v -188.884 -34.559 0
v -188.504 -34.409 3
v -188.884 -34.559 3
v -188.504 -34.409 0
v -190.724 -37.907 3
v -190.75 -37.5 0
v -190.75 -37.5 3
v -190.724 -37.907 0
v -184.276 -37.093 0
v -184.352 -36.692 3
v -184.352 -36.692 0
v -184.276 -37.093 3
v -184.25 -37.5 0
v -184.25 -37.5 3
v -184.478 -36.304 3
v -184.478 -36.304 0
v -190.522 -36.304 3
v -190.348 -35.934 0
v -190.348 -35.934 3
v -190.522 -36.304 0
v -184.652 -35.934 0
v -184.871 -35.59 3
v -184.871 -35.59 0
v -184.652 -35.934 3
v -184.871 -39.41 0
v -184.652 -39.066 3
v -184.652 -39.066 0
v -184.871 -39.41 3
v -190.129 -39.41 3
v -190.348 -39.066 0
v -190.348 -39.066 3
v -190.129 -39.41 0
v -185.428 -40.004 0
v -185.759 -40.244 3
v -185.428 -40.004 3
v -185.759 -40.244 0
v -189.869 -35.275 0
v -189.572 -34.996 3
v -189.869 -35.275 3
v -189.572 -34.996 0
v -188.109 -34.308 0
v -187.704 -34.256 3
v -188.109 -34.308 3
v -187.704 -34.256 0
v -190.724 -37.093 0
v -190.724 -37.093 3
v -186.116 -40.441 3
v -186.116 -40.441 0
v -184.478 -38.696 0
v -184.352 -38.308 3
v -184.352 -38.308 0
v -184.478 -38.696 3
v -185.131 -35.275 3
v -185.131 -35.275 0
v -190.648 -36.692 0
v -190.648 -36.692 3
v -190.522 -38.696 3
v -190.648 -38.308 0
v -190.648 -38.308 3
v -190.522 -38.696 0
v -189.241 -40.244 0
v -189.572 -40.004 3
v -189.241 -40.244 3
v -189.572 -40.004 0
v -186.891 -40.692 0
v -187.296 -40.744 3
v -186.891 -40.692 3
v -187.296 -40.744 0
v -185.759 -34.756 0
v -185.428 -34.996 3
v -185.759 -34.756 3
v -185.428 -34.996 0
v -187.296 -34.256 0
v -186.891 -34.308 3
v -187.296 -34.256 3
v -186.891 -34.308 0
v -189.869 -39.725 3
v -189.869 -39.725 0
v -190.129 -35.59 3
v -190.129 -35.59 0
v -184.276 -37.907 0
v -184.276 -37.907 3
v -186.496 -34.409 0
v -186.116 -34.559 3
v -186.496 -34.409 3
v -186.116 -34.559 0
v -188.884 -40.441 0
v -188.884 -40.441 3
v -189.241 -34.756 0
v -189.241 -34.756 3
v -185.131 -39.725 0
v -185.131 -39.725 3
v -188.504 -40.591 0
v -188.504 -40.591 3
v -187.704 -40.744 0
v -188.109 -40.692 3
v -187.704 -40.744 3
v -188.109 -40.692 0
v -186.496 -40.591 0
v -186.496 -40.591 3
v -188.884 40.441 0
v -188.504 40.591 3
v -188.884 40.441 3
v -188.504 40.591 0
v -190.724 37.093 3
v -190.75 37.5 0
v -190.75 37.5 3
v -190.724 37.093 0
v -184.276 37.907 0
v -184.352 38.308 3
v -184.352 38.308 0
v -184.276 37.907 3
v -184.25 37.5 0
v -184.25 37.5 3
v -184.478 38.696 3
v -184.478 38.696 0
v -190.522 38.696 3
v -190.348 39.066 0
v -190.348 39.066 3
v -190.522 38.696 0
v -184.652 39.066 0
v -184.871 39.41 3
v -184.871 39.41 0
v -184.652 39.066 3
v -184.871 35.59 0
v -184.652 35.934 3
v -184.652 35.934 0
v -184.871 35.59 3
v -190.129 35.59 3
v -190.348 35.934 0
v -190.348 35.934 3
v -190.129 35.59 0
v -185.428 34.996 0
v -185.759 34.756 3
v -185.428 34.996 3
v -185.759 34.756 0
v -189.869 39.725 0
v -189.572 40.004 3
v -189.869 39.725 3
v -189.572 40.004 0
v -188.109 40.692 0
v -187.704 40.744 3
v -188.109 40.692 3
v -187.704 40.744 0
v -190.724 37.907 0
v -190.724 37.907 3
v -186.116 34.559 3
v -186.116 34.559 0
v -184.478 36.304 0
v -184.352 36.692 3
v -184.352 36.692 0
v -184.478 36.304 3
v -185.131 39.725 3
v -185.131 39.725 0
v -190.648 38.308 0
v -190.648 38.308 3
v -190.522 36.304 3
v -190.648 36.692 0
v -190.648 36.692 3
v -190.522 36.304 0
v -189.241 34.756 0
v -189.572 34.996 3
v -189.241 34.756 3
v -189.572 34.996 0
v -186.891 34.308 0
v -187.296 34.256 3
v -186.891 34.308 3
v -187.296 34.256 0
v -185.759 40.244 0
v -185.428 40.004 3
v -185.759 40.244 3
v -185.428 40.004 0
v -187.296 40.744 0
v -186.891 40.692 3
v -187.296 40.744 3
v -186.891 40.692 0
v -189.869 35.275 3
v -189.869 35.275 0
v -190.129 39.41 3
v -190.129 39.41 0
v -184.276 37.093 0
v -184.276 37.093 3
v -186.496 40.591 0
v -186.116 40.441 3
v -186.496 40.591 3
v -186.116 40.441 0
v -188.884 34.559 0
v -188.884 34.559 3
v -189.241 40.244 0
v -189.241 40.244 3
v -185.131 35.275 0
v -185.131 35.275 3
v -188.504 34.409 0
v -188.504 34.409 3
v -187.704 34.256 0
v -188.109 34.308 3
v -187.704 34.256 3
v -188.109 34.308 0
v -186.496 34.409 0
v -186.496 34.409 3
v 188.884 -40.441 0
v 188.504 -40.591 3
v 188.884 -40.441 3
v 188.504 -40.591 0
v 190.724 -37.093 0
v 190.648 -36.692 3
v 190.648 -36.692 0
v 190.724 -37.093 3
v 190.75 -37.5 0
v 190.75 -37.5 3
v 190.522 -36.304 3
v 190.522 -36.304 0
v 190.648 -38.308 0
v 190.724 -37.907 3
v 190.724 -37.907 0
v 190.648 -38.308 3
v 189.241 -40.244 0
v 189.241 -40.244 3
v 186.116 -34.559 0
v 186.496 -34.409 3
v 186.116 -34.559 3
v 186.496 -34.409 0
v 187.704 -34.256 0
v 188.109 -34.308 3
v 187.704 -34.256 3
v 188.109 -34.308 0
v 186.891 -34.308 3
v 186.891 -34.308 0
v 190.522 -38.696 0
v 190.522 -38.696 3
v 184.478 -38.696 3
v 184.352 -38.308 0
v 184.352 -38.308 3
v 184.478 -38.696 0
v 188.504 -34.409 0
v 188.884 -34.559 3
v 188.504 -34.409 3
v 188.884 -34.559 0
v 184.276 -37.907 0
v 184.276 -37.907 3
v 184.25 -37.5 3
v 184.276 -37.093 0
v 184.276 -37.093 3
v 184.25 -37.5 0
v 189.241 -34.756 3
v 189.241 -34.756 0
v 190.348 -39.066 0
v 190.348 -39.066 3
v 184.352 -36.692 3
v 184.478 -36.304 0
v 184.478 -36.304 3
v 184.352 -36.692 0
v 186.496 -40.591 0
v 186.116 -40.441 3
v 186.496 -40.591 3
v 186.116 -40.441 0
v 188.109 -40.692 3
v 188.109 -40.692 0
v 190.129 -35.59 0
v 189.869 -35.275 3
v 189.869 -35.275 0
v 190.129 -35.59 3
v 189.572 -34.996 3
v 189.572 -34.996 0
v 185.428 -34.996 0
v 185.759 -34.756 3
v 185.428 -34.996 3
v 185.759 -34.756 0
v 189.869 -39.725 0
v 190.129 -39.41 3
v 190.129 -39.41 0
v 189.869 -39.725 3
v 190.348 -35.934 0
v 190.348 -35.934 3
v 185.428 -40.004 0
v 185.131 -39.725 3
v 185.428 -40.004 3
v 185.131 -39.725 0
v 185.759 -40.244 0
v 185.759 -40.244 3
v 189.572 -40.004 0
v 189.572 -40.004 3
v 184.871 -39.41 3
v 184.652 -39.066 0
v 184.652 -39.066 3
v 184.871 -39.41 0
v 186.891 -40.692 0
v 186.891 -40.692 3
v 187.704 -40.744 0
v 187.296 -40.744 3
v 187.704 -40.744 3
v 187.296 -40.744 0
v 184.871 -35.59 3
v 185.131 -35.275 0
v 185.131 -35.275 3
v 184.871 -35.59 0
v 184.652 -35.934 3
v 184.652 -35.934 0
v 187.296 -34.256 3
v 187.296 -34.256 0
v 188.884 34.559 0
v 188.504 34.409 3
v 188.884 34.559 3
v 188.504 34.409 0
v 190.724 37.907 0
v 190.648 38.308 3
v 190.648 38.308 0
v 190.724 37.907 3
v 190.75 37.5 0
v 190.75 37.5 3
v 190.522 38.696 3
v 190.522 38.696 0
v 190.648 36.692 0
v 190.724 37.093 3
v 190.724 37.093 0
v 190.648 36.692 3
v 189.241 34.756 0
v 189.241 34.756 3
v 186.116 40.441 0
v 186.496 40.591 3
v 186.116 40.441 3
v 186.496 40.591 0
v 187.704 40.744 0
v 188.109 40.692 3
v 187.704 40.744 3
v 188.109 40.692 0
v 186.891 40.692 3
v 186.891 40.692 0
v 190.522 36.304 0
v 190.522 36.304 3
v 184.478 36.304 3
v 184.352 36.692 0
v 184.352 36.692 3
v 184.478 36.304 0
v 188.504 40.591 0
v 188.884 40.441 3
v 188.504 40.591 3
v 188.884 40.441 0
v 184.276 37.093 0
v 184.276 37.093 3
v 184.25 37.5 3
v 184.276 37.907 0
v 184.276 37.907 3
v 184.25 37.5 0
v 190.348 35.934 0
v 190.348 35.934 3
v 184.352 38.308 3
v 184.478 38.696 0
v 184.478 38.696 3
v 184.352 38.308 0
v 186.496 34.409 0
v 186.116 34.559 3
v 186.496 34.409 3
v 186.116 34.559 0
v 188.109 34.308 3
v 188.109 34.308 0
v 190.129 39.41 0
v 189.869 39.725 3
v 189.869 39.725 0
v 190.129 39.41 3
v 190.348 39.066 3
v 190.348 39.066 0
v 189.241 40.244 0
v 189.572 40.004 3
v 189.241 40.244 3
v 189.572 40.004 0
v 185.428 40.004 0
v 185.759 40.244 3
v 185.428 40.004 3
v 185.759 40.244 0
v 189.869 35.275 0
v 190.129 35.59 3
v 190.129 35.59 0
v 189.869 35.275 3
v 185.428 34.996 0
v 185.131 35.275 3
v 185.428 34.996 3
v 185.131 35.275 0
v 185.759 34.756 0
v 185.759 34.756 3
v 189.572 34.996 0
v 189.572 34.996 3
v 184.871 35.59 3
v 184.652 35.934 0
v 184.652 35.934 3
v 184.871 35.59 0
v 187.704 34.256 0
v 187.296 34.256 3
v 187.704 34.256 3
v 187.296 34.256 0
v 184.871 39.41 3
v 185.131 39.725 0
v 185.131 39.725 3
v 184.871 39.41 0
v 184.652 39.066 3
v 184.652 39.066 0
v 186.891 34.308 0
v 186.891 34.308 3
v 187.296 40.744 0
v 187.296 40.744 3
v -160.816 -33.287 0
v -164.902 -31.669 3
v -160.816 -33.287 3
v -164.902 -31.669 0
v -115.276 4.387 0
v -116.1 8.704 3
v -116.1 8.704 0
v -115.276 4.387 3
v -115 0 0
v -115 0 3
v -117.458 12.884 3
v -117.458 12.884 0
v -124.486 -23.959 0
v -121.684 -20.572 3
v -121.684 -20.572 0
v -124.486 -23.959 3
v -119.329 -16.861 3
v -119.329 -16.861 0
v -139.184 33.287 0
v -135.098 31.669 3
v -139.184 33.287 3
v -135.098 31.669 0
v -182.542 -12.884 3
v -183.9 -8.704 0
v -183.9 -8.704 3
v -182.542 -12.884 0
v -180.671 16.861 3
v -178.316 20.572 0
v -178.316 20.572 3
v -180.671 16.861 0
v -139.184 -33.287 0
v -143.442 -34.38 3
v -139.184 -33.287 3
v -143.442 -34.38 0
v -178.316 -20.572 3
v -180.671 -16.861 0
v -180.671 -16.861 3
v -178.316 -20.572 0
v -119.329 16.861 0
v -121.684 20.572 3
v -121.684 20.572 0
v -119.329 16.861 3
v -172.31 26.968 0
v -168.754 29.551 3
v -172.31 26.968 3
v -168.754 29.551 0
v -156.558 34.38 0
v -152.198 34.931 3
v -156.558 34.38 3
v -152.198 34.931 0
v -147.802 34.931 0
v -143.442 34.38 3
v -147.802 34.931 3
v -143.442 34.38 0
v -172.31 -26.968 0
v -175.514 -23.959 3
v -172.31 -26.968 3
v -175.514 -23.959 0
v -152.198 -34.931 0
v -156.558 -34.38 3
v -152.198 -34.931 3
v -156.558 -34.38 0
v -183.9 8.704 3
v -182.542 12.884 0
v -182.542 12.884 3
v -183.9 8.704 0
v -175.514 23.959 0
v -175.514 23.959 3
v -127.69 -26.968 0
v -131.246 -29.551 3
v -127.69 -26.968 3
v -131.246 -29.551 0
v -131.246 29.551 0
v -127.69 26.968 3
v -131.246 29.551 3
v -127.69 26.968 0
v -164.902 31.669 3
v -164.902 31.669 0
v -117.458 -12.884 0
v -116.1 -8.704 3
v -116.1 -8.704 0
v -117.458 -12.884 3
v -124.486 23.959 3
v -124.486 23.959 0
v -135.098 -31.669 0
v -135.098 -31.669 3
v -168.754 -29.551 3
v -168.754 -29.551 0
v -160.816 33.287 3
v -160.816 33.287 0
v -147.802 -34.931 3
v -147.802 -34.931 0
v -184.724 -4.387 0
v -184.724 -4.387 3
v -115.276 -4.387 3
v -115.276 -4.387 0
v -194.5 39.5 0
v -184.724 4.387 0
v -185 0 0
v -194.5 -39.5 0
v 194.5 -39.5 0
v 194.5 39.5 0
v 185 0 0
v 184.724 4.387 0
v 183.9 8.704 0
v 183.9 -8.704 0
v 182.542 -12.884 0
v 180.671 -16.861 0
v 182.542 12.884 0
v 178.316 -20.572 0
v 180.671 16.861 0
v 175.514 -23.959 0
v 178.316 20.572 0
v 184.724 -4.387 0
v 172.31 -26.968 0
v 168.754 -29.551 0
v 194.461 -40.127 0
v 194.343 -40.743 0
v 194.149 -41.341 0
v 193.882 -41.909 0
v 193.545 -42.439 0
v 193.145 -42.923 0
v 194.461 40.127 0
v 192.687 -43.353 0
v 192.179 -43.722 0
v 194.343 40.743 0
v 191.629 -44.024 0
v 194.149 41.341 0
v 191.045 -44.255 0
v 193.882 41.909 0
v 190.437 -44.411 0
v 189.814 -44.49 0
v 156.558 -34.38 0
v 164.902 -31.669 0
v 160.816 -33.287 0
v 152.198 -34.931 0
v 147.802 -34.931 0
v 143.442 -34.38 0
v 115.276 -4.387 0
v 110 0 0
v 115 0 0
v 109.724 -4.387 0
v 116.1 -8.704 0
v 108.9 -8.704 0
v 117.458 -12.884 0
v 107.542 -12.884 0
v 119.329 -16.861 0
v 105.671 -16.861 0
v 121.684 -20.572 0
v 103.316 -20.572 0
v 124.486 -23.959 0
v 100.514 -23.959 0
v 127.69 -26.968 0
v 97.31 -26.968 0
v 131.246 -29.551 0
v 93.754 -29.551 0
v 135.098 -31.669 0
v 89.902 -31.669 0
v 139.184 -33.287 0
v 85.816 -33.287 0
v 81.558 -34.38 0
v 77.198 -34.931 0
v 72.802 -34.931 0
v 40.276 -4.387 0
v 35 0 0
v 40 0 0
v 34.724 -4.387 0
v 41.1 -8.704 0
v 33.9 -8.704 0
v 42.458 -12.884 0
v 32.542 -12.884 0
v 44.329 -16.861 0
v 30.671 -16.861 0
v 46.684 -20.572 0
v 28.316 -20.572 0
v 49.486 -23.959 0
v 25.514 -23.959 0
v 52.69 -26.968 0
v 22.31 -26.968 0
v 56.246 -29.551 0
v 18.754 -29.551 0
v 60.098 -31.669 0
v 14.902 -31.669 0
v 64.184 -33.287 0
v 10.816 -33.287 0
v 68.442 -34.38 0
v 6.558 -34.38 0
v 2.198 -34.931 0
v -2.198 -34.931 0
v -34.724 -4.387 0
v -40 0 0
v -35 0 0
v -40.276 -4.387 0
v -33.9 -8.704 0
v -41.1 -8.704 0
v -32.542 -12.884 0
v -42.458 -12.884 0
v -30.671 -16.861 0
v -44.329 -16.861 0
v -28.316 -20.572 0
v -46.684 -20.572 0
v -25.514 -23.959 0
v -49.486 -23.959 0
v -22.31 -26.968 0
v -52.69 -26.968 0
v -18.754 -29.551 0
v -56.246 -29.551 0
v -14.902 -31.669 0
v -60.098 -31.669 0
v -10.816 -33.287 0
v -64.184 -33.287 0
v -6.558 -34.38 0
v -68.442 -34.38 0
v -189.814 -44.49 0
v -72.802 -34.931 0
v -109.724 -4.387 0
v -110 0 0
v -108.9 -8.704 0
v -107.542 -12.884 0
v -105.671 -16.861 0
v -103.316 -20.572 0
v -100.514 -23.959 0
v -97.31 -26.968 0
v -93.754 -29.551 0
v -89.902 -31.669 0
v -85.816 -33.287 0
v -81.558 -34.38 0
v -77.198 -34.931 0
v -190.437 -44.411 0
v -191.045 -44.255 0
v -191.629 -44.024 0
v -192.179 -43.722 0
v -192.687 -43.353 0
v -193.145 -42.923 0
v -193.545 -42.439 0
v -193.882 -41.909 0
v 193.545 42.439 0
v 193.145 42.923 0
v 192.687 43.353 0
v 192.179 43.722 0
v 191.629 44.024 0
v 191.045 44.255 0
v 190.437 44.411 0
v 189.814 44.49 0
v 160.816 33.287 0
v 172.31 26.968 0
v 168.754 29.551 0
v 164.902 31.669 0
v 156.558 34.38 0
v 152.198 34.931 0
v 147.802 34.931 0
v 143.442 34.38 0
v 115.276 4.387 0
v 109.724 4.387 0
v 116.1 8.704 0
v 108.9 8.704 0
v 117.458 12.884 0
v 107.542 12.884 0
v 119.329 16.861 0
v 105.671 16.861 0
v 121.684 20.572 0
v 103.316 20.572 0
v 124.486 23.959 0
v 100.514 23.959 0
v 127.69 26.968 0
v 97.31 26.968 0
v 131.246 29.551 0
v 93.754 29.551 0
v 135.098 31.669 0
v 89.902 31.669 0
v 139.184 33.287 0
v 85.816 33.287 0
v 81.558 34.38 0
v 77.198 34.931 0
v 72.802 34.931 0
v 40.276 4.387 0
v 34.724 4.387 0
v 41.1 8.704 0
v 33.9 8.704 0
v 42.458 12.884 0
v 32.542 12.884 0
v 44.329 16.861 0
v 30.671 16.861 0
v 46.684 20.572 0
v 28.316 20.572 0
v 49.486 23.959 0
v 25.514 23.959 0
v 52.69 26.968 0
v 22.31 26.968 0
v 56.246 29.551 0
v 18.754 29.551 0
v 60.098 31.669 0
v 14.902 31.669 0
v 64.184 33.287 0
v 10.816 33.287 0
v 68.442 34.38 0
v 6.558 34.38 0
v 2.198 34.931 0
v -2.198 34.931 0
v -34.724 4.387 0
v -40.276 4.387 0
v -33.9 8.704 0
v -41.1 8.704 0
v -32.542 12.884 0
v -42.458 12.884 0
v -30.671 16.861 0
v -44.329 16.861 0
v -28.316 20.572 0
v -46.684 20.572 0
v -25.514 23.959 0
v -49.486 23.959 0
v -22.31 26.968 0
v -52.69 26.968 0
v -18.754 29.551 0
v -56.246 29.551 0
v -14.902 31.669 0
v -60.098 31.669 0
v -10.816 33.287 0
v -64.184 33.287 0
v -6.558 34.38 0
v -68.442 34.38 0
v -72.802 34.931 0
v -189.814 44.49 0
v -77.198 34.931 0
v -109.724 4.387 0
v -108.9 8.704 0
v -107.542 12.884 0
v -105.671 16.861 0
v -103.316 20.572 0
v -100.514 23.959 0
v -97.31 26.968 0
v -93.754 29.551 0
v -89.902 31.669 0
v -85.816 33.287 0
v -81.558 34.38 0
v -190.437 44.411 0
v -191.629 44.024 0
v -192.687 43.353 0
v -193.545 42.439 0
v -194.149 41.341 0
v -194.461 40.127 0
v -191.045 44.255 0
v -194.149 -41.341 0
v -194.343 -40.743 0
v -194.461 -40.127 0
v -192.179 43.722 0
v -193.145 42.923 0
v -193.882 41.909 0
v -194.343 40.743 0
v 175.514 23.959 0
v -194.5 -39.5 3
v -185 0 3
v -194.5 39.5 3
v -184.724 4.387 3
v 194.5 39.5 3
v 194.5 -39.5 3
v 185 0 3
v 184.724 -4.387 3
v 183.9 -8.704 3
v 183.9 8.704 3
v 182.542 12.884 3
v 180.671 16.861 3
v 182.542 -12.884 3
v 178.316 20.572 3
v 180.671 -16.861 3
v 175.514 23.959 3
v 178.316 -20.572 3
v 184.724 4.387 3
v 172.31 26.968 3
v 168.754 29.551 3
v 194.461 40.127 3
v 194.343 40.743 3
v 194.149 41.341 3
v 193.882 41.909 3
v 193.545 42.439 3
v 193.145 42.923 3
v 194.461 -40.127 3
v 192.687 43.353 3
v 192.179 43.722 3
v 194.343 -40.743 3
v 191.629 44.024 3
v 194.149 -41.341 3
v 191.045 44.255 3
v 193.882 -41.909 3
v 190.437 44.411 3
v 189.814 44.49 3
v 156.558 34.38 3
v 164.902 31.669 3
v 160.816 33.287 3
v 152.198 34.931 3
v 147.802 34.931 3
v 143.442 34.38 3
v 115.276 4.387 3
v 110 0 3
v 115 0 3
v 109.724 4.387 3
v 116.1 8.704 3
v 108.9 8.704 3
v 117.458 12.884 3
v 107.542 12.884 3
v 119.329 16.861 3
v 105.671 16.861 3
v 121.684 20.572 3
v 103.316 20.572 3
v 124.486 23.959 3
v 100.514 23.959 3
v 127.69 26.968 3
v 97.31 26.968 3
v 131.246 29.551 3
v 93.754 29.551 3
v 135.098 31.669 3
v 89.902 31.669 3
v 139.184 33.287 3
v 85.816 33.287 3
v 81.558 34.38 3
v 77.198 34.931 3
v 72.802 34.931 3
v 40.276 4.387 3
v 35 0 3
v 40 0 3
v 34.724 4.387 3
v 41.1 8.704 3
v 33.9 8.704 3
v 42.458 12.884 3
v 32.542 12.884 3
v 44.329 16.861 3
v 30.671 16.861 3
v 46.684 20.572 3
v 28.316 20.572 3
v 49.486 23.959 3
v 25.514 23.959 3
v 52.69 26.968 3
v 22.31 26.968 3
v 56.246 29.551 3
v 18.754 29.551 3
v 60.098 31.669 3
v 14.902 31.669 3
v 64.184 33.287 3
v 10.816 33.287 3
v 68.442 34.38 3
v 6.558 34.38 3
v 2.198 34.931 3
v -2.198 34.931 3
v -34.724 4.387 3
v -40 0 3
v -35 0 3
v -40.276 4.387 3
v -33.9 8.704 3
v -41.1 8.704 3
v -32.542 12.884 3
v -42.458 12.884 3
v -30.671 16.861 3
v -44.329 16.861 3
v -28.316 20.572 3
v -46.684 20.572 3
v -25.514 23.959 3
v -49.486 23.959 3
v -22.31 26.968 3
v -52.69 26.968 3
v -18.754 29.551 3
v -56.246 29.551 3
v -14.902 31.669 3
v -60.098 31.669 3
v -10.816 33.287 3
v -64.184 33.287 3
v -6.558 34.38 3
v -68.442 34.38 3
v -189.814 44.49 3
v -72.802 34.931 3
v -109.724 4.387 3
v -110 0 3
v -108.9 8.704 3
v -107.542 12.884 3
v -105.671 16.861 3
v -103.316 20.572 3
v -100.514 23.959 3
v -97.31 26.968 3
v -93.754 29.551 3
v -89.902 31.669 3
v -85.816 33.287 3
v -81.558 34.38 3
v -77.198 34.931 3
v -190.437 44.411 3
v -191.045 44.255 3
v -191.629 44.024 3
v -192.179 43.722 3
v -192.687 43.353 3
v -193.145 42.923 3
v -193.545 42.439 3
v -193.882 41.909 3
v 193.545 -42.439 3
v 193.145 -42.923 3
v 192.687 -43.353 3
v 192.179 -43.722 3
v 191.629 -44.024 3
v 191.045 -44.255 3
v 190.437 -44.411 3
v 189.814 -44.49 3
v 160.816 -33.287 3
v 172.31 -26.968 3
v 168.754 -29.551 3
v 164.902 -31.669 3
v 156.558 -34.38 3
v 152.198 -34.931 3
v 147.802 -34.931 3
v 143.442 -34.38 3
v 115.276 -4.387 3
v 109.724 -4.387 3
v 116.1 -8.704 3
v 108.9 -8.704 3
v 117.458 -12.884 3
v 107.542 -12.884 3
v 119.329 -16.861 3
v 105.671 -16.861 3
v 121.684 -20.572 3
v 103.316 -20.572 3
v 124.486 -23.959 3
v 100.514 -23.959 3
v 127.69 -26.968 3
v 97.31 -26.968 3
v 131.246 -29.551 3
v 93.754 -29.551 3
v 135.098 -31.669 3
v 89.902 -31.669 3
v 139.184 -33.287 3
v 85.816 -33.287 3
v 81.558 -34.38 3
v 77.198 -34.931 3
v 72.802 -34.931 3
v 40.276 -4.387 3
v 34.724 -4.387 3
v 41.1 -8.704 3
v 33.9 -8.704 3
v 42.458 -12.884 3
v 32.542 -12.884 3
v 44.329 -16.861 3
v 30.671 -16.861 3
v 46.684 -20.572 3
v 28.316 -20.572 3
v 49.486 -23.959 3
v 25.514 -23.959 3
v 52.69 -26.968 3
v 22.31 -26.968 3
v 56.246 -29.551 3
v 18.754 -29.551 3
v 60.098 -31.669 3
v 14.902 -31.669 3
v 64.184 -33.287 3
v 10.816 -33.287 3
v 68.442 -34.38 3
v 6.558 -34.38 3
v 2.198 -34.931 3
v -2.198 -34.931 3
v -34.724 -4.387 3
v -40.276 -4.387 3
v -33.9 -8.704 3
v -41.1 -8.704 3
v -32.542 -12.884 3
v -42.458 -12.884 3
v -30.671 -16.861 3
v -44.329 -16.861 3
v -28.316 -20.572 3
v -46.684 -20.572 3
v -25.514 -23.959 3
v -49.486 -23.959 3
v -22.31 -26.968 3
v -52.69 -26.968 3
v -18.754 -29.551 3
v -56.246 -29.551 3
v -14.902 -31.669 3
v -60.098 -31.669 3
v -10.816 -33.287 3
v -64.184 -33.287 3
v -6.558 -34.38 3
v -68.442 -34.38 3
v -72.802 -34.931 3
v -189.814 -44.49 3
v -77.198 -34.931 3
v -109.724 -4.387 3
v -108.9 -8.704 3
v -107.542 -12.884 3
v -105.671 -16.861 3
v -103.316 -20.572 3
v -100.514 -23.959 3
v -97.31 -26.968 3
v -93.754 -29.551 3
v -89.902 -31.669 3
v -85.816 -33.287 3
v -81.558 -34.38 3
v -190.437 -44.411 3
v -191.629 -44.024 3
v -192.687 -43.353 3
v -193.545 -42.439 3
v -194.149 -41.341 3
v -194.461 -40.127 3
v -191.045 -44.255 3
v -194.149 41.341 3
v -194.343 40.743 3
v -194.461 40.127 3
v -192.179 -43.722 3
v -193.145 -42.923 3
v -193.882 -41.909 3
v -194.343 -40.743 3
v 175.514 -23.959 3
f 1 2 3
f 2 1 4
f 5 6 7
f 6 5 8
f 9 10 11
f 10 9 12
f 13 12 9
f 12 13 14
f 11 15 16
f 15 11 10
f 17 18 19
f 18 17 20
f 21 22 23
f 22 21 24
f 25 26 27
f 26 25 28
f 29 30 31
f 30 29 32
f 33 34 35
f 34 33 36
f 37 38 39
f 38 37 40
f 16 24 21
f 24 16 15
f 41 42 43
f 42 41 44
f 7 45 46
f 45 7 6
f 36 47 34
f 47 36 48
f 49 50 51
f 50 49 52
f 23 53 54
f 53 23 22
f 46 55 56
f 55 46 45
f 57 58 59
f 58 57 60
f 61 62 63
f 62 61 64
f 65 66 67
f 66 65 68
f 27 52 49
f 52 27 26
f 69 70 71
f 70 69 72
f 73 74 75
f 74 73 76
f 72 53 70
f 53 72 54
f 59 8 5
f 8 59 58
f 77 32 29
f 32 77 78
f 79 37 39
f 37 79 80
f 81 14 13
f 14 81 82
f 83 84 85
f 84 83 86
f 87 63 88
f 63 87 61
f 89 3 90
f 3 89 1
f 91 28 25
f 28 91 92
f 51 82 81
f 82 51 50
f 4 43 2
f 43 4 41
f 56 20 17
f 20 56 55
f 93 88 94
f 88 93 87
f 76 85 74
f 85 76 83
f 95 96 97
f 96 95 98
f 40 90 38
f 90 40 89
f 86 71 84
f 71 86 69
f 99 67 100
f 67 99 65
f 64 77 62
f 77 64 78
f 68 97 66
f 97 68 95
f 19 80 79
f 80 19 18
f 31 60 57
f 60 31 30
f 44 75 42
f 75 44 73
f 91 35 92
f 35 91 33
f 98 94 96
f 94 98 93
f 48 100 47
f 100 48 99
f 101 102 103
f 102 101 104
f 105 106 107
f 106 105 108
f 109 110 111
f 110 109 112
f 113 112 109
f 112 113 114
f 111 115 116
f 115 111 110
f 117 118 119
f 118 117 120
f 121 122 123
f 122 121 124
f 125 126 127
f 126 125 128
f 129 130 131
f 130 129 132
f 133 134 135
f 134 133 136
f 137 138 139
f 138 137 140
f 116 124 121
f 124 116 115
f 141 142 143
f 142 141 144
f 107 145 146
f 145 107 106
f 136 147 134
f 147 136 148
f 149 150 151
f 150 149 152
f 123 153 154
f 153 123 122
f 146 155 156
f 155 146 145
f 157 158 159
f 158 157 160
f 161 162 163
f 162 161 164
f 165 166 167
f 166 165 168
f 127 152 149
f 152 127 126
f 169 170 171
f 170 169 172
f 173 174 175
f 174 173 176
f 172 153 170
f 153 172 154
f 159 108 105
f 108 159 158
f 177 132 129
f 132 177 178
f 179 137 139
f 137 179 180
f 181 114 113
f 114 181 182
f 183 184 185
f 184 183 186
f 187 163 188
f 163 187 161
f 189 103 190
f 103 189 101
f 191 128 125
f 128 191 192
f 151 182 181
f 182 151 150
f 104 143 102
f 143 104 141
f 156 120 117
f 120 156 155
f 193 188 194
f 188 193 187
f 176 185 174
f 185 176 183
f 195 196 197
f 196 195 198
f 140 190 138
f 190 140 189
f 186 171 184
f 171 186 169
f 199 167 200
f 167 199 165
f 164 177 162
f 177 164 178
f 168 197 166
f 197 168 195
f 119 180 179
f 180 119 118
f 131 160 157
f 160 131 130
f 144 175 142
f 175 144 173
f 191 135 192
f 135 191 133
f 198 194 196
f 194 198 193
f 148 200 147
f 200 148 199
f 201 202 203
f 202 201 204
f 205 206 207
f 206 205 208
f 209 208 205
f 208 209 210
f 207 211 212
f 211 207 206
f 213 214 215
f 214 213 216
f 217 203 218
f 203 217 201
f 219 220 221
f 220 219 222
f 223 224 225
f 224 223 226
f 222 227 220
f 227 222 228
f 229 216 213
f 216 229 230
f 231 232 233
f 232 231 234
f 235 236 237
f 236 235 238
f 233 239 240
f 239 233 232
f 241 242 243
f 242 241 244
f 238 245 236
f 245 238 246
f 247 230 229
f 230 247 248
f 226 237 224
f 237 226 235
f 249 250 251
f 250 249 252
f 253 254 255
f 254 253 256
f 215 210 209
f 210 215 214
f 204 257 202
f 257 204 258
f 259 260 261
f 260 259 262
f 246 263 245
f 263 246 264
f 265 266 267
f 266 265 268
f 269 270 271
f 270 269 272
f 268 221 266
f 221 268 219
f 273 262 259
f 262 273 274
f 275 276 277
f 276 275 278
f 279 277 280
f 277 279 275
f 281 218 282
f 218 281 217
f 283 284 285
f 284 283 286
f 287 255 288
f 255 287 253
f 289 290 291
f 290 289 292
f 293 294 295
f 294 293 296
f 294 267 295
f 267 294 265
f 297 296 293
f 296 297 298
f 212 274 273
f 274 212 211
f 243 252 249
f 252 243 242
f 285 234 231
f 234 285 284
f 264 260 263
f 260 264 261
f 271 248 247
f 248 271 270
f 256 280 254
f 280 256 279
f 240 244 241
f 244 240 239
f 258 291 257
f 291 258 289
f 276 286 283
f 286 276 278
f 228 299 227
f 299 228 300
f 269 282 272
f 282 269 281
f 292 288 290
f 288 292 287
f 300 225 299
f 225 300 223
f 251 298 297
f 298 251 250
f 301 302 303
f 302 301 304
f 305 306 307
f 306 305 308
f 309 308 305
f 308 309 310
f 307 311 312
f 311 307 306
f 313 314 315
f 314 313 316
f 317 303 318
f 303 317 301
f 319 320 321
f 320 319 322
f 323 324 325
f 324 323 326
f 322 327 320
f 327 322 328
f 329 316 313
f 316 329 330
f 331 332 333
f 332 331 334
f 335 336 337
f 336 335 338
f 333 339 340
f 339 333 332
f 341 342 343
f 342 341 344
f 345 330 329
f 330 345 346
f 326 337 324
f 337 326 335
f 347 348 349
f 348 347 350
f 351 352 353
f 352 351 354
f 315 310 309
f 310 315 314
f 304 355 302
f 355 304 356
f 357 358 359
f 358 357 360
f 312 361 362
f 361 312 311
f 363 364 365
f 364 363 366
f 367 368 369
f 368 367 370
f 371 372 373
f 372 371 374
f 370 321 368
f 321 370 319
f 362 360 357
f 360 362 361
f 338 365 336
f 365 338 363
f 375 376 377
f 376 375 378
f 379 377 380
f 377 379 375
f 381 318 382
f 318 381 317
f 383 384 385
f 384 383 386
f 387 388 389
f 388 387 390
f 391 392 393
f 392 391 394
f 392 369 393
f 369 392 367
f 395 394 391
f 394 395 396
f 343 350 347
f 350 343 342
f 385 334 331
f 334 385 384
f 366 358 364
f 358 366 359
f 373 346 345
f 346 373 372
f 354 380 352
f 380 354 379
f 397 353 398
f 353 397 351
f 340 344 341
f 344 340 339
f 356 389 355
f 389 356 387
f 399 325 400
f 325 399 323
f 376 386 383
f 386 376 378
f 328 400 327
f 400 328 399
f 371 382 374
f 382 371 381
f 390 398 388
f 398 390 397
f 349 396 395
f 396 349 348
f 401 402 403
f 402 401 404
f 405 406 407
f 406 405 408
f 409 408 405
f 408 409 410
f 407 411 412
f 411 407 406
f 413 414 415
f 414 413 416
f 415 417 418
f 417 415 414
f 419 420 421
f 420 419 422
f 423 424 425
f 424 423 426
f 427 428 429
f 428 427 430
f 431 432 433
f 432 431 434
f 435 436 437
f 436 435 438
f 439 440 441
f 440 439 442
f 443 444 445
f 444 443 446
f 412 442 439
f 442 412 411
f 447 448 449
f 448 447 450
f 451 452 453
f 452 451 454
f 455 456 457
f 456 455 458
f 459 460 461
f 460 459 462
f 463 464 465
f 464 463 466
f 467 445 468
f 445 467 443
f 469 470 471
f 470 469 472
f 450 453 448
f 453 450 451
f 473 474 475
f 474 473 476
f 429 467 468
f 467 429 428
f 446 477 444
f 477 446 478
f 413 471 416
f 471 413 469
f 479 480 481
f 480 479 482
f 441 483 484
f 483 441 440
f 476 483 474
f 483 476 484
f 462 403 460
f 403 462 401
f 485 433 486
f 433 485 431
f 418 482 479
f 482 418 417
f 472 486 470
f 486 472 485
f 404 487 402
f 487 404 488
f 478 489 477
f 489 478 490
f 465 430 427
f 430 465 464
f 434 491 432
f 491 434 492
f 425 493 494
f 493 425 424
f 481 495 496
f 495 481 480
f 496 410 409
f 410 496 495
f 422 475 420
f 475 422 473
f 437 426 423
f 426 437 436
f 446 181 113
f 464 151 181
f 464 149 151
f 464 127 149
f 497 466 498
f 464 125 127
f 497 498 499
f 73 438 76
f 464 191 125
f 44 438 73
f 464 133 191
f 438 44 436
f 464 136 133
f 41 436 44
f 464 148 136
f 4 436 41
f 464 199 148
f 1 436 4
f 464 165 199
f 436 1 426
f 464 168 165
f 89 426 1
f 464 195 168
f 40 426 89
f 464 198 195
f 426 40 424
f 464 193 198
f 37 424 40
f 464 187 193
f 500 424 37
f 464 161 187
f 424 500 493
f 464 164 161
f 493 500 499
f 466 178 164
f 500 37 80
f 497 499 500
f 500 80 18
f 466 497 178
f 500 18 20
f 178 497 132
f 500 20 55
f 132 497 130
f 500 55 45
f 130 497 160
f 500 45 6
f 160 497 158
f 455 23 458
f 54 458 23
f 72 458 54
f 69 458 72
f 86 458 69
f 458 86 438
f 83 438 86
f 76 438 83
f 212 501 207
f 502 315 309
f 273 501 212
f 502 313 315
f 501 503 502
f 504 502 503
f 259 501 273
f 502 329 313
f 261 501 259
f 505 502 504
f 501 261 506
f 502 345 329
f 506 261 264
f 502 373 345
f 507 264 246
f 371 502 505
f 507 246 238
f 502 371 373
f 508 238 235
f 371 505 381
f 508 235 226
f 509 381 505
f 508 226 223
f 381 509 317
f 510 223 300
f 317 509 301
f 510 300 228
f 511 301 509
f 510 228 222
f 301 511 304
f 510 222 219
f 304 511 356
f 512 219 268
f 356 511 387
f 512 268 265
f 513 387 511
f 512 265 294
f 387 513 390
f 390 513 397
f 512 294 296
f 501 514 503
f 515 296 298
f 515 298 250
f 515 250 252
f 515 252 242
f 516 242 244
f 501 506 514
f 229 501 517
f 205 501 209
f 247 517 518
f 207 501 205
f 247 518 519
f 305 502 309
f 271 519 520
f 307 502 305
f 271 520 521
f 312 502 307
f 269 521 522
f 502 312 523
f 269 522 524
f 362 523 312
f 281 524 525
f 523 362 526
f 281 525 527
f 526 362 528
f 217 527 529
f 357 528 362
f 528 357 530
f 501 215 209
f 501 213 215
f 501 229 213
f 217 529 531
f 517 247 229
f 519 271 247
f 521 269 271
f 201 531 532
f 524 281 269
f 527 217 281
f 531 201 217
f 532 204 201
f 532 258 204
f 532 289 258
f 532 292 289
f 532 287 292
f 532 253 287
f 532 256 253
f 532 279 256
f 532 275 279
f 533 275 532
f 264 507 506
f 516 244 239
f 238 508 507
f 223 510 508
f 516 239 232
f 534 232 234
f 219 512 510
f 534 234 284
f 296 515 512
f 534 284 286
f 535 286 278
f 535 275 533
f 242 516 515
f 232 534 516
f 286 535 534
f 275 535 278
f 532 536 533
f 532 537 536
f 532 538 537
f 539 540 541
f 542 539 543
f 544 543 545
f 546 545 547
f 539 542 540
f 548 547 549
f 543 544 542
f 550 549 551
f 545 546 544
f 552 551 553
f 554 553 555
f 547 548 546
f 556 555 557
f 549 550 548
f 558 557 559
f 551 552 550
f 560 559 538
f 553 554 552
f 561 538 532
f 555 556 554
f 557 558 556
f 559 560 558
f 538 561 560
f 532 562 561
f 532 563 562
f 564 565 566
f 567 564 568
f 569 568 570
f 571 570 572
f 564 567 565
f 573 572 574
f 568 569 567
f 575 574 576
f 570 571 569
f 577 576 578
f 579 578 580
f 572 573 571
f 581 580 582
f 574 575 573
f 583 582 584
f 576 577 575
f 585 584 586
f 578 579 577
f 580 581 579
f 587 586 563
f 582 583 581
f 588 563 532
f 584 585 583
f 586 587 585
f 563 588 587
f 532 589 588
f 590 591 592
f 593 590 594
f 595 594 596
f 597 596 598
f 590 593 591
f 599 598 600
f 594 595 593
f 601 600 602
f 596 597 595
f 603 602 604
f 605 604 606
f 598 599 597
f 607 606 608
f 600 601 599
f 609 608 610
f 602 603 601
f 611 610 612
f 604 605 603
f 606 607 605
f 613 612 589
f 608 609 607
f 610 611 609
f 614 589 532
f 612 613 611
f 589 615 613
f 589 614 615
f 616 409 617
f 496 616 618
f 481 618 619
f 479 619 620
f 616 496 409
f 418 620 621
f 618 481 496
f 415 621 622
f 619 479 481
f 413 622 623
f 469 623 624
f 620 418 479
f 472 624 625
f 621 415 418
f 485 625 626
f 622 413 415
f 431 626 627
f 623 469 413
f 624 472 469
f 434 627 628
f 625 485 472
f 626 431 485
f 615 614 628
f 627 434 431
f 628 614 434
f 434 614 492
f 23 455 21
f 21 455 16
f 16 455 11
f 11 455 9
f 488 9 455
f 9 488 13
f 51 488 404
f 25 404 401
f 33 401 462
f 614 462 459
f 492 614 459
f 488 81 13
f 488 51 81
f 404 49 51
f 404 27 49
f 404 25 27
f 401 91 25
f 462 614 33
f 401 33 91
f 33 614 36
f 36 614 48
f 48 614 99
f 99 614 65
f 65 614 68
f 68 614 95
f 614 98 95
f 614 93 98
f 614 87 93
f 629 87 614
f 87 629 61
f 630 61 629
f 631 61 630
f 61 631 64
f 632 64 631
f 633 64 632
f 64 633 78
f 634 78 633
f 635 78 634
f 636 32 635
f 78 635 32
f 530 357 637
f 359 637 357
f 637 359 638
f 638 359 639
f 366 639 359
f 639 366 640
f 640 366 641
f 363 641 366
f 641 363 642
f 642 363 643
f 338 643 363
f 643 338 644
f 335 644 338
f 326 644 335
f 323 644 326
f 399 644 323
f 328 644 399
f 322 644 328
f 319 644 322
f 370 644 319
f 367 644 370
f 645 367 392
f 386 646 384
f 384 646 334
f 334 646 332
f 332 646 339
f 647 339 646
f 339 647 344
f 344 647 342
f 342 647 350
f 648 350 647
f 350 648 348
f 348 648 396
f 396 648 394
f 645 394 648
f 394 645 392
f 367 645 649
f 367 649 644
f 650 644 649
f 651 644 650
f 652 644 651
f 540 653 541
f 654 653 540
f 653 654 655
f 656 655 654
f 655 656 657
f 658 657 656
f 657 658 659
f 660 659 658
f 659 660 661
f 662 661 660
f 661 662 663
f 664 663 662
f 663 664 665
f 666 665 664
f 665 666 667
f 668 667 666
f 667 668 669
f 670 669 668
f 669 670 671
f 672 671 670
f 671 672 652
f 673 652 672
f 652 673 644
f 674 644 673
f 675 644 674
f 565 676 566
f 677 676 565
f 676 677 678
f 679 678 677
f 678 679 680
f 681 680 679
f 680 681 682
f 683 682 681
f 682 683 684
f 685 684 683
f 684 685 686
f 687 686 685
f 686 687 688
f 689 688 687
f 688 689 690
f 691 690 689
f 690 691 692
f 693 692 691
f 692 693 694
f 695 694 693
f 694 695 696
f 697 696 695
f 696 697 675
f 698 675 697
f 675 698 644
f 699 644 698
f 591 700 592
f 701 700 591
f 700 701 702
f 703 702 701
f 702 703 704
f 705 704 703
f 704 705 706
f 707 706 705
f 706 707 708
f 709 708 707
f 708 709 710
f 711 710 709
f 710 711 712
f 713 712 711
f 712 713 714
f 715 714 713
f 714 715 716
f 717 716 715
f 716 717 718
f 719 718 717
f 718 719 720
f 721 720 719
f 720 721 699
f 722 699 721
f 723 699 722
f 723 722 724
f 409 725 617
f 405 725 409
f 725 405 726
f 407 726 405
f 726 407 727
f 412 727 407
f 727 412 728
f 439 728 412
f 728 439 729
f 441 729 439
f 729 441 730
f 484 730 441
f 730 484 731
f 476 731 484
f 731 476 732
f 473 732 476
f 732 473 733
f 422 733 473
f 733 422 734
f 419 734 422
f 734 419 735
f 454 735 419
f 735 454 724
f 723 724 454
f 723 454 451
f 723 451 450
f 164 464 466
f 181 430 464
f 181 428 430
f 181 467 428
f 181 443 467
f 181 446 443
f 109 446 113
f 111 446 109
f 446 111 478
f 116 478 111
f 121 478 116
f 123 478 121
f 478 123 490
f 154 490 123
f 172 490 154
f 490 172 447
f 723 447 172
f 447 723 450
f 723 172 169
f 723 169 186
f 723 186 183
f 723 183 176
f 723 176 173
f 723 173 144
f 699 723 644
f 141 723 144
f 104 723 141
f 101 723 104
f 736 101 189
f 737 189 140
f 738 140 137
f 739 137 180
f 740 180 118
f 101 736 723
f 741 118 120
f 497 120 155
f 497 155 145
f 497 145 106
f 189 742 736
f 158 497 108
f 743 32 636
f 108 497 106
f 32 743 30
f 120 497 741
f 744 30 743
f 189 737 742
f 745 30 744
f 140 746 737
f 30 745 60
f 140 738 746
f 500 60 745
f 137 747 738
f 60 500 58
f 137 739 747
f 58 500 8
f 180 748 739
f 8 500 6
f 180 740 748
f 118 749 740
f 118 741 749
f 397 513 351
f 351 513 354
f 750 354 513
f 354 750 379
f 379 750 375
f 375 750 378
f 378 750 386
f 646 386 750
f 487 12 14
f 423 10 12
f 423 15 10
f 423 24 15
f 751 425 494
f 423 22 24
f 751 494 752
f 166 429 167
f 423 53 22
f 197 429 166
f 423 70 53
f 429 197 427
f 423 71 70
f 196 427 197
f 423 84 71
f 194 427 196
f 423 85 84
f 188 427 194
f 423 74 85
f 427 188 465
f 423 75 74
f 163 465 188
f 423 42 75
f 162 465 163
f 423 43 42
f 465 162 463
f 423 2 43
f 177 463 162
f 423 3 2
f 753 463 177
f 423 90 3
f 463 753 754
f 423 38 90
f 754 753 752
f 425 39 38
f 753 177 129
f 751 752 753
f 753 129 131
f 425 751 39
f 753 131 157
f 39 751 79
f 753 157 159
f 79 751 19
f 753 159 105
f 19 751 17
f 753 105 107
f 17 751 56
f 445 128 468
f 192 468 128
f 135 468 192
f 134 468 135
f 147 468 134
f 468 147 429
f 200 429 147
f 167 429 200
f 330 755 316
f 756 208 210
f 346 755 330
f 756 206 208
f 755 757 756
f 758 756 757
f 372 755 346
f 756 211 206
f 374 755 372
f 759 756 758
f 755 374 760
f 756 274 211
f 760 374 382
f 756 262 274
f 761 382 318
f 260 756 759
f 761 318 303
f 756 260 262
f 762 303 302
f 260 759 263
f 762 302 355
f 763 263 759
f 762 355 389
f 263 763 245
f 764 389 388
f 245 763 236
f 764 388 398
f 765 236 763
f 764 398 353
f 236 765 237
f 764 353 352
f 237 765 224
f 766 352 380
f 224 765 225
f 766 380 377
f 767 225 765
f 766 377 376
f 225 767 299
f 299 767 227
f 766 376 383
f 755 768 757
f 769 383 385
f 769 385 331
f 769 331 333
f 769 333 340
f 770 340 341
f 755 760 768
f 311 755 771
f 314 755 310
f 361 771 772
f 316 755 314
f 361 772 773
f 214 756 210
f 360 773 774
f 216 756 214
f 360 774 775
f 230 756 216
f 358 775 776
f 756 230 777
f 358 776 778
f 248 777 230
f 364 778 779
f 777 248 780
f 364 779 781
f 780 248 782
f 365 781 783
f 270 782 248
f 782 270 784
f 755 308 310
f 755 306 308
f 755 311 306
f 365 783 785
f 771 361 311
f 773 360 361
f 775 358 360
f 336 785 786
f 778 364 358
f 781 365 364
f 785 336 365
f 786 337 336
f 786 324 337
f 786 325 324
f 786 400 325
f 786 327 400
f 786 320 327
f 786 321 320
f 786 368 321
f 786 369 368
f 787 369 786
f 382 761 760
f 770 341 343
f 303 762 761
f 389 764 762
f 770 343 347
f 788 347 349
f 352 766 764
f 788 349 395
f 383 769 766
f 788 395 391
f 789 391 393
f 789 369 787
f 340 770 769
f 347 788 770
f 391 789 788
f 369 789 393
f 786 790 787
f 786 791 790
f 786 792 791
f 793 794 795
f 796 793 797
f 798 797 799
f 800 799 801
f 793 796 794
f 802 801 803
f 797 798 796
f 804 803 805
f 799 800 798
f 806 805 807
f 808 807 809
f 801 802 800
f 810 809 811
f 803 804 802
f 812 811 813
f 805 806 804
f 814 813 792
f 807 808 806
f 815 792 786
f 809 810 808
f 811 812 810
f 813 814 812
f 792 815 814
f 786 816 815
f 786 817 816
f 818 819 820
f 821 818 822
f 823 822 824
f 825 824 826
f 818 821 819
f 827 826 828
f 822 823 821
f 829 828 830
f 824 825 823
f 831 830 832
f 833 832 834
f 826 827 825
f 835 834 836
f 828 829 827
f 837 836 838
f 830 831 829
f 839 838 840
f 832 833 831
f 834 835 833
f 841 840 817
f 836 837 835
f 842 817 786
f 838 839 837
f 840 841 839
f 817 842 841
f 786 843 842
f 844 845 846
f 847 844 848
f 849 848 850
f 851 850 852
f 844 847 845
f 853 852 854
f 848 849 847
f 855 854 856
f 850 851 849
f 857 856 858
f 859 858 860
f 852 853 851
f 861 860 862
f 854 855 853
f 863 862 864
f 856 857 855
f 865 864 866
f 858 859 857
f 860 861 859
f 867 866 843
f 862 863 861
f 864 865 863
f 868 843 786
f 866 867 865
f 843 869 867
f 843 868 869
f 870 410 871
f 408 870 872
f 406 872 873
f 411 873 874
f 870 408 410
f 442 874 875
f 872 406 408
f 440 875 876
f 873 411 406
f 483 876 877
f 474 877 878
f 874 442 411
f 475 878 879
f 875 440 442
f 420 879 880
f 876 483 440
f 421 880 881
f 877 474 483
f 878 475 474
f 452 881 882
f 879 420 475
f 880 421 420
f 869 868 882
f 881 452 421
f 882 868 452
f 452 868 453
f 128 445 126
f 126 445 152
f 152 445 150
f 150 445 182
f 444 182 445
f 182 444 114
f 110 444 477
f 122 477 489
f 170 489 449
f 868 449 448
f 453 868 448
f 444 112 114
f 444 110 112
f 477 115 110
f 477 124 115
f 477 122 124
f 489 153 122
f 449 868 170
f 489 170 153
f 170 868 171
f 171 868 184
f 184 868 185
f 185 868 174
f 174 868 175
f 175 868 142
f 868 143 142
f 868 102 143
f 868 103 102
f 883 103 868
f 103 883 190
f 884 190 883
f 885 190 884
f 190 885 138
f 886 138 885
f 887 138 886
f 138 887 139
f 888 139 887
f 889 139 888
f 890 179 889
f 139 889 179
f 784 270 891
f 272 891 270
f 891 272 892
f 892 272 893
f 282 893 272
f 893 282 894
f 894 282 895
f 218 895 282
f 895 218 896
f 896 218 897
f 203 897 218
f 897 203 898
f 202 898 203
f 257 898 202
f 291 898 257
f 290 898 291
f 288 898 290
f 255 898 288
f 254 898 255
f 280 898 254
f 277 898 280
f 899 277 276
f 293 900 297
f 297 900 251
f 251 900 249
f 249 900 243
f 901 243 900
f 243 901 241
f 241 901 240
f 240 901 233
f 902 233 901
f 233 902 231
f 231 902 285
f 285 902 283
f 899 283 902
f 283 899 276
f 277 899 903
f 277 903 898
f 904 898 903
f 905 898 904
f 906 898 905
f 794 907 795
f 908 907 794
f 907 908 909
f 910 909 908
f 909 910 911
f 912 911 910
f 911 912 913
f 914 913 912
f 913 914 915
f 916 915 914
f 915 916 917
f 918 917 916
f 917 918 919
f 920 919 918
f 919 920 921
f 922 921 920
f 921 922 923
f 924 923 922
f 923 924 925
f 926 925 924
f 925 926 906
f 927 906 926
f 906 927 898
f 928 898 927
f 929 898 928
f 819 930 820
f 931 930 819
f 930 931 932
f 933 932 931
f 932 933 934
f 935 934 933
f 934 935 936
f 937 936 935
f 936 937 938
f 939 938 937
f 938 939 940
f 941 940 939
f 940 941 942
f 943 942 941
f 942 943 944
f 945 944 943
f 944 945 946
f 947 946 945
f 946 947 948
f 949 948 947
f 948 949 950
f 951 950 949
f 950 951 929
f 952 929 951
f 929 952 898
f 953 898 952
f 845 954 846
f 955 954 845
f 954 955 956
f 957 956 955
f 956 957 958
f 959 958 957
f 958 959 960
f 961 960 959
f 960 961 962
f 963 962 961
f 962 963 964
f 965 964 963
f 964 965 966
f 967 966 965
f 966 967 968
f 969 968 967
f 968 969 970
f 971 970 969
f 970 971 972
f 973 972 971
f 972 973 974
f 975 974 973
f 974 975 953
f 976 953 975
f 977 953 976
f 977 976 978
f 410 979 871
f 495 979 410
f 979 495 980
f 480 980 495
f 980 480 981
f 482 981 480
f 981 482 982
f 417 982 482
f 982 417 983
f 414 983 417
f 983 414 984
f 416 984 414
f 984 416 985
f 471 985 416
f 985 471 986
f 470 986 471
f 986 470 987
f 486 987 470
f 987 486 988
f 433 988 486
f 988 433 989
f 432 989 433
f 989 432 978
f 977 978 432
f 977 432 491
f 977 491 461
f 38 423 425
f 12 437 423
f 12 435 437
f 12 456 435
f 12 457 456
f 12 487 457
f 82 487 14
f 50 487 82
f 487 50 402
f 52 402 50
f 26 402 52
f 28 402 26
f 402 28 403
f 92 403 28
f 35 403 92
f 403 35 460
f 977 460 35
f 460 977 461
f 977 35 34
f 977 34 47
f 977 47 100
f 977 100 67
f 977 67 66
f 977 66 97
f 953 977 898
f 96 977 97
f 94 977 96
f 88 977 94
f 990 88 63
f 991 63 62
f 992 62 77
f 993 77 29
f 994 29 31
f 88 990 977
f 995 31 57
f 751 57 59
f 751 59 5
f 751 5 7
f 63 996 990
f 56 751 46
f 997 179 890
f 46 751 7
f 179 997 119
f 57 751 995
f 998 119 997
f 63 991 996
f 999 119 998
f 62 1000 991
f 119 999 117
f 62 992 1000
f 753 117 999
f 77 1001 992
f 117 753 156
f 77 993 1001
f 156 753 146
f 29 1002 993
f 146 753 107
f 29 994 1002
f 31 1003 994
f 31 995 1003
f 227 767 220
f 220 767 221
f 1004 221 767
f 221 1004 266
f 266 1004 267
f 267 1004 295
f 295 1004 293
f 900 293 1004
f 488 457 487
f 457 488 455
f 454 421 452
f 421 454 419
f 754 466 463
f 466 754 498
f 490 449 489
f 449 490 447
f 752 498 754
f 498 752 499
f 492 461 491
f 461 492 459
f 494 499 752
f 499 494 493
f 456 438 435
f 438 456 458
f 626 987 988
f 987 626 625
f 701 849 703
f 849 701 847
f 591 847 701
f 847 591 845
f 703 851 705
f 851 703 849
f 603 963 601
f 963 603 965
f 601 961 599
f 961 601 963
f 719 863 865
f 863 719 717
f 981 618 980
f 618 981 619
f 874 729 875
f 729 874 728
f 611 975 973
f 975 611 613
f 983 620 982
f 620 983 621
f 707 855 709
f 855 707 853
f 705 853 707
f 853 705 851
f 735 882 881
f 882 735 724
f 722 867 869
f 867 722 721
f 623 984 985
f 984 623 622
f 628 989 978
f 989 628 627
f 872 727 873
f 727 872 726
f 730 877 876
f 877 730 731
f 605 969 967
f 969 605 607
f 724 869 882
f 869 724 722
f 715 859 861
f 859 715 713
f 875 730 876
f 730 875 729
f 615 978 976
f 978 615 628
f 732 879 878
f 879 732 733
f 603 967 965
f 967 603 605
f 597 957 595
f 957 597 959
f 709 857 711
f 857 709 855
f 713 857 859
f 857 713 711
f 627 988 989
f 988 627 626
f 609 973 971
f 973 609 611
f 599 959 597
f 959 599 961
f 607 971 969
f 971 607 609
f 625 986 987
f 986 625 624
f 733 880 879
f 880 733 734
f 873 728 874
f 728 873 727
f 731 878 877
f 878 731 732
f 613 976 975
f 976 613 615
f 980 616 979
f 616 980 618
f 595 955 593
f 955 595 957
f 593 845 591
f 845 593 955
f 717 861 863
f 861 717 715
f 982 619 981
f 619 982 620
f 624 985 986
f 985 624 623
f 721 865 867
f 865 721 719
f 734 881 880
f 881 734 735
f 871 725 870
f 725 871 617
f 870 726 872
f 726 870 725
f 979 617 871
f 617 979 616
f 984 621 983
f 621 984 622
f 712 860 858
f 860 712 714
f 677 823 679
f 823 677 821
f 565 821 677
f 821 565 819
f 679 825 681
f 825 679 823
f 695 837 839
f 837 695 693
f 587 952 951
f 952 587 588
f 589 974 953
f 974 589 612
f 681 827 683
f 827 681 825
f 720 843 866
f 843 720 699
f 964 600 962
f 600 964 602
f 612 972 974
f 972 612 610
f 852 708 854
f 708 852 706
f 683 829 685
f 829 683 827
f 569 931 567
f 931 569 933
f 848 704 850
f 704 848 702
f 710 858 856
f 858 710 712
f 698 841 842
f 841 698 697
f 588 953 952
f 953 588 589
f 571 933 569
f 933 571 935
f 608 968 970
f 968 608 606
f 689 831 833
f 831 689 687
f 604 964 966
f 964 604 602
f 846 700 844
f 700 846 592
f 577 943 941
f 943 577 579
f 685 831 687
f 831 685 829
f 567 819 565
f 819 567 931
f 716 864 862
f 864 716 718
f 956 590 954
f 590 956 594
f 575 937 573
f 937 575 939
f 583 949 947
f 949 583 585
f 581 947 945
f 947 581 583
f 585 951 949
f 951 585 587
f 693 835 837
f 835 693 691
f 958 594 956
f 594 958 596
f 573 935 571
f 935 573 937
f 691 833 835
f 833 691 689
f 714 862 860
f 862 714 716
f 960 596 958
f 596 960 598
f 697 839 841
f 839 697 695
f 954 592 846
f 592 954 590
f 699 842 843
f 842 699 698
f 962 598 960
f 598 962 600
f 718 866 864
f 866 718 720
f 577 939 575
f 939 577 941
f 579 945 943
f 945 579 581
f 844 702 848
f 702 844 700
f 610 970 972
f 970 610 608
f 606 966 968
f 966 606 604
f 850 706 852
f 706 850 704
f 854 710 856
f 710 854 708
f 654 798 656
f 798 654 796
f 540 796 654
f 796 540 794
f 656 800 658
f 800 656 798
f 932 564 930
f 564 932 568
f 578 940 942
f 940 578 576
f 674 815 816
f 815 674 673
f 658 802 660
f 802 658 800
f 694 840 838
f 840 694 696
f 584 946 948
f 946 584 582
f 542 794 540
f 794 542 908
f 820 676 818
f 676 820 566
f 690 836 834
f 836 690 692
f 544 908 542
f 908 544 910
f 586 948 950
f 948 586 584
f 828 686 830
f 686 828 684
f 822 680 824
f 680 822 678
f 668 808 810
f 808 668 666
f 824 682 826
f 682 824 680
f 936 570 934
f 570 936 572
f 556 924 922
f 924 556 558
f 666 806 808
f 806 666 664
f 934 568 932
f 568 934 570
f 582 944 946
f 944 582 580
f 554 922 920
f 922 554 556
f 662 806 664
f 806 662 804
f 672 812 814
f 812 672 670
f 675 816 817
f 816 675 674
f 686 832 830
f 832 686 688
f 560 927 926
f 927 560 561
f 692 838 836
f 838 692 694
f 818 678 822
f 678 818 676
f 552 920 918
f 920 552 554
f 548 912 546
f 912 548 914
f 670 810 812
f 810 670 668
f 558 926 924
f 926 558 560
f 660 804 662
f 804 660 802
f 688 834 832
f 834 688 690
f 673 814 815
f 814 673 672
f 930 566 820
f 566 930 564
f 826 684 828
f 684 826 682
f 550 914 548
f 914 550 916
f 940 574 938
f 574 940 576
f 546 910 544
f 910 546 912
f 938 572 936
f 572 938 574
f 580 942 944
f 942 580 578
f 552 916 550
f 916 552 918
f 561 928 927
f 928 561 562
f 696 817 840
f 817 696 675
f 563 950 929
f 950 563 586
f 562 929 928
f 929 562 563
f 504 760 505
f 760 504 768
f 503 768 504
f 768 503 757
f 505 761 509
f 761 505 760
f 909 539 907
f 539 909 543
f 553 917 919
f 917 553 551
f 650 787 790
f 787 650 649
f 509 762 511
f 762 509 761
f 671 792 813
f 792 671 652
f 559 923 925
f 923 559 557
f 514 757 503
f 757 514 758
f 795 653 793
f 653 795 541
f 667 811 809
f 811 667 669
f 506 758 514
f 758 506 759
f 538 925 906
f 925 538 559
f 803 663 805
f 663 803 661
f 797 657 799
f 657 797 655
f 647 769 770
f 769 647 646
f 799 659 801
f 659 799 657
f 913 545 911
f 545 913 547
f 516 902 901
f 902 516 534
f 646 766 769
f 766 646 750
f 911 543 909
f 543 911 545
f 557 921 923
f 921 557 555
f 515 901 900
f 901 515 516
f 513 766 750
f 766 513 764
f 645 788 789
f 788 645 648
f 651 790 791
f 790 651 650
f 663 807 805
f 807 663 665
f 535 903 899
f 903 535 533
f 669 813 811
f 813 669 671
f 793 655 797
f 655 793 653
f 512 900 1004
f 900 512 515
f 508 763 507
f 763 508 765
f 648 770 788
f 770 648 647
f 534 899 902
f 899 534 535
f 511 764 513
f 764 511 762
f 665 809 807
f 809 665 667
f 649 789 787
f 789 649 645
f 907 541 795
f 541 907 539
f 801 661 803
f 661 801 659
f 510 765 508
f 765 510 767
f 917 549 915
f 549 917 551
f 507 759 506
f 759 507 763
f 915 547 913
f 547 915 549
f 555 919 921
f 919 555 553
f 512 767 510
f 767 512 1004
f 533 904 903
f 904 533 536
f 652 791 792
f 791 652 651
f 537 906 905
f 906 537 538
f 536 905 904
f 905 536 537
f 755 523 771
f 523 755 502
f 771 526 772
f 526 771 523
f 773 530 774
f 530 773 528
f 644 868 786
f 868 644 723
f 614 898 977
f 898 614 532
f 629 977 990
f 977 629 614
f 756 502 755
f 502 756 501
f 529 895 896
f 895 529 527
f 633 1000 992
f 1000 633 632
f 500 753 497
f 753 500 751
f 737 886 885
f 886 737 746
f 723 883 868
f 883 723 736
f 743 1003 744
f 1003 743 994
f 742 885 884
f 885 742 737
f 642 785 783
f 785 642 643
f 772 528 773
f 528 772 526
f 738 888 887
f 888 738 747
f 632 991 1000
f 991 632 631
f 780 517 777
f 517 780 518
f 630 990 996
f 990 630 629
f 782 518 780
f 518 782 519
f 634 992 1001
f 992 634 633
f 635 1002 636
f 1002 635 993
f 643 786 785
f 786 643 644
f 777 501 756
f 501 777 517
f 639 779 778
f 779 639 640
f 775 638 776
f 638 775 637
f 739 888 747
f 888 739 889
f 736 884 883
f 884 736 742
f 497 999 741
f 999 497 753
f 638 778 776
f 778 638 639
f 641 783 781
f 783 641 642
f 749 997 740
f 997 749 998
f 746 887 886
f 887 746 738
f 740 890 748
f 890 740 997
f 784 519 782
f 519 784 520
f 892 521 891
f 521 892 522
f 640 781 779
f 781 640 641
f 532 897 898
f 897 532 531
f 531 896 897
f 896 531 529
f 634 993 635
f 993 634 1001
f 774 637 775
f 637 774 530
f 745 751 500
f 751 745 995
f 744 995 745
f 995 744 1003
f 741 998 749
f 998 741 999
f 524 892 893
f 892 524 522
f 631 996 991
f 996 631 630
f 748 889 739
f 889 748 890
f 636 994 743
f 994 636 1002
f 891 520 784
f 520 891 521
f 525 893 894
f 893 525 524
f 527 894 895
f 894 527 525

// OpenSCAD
$fn = 50;


difference() {
	union() {
		hull() {
			translate(v = [-189.5000000000, 39.5000000000, 0]) {
				cylinder(h = 3, r = 5);
			}
			translate(v = [189.5000000000, 39.5000000000, 0]) {
				cylinder(h = 3, r = 5);
			}
			translate(v = [-189.5000000000, -39.5000000000, 0]) {
				cylinder(h = 3, r = 5);
			}
			translate(v = [189.5000000000, -39.5000000000, 0]) {
				cylinder(h = 3, r = 5);
			}
		}
	}
	union() {
		#translate(v = [-187.5000000000, -37.5000000000, -100.0000000000]) {
			cylinder(h = 200, r = 3.2500000000);
		}
		#translate(v = [-187.5000000000, 37.5000000000, -100.0000000000]) {
			cylinder(h = 200, r = 3.2500000000);
		}
		#translate(v = [187.5000000000, -37.5000000000, -100.0000000000]) {
			cylinder(h = 200, r = 3.2500000000);
		}
		#translate(v = [187.5000000000, 37.5000000000, -100.0000000000]) {
			cylinder(h = 200, r = 3.2500000000);
		}
		#translate(v = [-150.0000000000, 0, 0]) {
			cylinder(h = 3, r = 35.0000000000);
		}
		#translate(v = [-75.0000000000, 0, 0]) {
			cylinder(h = 3, r = 35.0000000000);
		}
		#cylinder(h = 3, r = 35.0000000000);
		#translate(v = [75.0000000000, 0, 0]) {
			cylinder(h = 3, r = 35.0000000000);
		}
		#translate(v = [150.0000000000, 0, 0]) {
			cylinder(h = 3, r = 35.0000000000);
		}
	}
}
